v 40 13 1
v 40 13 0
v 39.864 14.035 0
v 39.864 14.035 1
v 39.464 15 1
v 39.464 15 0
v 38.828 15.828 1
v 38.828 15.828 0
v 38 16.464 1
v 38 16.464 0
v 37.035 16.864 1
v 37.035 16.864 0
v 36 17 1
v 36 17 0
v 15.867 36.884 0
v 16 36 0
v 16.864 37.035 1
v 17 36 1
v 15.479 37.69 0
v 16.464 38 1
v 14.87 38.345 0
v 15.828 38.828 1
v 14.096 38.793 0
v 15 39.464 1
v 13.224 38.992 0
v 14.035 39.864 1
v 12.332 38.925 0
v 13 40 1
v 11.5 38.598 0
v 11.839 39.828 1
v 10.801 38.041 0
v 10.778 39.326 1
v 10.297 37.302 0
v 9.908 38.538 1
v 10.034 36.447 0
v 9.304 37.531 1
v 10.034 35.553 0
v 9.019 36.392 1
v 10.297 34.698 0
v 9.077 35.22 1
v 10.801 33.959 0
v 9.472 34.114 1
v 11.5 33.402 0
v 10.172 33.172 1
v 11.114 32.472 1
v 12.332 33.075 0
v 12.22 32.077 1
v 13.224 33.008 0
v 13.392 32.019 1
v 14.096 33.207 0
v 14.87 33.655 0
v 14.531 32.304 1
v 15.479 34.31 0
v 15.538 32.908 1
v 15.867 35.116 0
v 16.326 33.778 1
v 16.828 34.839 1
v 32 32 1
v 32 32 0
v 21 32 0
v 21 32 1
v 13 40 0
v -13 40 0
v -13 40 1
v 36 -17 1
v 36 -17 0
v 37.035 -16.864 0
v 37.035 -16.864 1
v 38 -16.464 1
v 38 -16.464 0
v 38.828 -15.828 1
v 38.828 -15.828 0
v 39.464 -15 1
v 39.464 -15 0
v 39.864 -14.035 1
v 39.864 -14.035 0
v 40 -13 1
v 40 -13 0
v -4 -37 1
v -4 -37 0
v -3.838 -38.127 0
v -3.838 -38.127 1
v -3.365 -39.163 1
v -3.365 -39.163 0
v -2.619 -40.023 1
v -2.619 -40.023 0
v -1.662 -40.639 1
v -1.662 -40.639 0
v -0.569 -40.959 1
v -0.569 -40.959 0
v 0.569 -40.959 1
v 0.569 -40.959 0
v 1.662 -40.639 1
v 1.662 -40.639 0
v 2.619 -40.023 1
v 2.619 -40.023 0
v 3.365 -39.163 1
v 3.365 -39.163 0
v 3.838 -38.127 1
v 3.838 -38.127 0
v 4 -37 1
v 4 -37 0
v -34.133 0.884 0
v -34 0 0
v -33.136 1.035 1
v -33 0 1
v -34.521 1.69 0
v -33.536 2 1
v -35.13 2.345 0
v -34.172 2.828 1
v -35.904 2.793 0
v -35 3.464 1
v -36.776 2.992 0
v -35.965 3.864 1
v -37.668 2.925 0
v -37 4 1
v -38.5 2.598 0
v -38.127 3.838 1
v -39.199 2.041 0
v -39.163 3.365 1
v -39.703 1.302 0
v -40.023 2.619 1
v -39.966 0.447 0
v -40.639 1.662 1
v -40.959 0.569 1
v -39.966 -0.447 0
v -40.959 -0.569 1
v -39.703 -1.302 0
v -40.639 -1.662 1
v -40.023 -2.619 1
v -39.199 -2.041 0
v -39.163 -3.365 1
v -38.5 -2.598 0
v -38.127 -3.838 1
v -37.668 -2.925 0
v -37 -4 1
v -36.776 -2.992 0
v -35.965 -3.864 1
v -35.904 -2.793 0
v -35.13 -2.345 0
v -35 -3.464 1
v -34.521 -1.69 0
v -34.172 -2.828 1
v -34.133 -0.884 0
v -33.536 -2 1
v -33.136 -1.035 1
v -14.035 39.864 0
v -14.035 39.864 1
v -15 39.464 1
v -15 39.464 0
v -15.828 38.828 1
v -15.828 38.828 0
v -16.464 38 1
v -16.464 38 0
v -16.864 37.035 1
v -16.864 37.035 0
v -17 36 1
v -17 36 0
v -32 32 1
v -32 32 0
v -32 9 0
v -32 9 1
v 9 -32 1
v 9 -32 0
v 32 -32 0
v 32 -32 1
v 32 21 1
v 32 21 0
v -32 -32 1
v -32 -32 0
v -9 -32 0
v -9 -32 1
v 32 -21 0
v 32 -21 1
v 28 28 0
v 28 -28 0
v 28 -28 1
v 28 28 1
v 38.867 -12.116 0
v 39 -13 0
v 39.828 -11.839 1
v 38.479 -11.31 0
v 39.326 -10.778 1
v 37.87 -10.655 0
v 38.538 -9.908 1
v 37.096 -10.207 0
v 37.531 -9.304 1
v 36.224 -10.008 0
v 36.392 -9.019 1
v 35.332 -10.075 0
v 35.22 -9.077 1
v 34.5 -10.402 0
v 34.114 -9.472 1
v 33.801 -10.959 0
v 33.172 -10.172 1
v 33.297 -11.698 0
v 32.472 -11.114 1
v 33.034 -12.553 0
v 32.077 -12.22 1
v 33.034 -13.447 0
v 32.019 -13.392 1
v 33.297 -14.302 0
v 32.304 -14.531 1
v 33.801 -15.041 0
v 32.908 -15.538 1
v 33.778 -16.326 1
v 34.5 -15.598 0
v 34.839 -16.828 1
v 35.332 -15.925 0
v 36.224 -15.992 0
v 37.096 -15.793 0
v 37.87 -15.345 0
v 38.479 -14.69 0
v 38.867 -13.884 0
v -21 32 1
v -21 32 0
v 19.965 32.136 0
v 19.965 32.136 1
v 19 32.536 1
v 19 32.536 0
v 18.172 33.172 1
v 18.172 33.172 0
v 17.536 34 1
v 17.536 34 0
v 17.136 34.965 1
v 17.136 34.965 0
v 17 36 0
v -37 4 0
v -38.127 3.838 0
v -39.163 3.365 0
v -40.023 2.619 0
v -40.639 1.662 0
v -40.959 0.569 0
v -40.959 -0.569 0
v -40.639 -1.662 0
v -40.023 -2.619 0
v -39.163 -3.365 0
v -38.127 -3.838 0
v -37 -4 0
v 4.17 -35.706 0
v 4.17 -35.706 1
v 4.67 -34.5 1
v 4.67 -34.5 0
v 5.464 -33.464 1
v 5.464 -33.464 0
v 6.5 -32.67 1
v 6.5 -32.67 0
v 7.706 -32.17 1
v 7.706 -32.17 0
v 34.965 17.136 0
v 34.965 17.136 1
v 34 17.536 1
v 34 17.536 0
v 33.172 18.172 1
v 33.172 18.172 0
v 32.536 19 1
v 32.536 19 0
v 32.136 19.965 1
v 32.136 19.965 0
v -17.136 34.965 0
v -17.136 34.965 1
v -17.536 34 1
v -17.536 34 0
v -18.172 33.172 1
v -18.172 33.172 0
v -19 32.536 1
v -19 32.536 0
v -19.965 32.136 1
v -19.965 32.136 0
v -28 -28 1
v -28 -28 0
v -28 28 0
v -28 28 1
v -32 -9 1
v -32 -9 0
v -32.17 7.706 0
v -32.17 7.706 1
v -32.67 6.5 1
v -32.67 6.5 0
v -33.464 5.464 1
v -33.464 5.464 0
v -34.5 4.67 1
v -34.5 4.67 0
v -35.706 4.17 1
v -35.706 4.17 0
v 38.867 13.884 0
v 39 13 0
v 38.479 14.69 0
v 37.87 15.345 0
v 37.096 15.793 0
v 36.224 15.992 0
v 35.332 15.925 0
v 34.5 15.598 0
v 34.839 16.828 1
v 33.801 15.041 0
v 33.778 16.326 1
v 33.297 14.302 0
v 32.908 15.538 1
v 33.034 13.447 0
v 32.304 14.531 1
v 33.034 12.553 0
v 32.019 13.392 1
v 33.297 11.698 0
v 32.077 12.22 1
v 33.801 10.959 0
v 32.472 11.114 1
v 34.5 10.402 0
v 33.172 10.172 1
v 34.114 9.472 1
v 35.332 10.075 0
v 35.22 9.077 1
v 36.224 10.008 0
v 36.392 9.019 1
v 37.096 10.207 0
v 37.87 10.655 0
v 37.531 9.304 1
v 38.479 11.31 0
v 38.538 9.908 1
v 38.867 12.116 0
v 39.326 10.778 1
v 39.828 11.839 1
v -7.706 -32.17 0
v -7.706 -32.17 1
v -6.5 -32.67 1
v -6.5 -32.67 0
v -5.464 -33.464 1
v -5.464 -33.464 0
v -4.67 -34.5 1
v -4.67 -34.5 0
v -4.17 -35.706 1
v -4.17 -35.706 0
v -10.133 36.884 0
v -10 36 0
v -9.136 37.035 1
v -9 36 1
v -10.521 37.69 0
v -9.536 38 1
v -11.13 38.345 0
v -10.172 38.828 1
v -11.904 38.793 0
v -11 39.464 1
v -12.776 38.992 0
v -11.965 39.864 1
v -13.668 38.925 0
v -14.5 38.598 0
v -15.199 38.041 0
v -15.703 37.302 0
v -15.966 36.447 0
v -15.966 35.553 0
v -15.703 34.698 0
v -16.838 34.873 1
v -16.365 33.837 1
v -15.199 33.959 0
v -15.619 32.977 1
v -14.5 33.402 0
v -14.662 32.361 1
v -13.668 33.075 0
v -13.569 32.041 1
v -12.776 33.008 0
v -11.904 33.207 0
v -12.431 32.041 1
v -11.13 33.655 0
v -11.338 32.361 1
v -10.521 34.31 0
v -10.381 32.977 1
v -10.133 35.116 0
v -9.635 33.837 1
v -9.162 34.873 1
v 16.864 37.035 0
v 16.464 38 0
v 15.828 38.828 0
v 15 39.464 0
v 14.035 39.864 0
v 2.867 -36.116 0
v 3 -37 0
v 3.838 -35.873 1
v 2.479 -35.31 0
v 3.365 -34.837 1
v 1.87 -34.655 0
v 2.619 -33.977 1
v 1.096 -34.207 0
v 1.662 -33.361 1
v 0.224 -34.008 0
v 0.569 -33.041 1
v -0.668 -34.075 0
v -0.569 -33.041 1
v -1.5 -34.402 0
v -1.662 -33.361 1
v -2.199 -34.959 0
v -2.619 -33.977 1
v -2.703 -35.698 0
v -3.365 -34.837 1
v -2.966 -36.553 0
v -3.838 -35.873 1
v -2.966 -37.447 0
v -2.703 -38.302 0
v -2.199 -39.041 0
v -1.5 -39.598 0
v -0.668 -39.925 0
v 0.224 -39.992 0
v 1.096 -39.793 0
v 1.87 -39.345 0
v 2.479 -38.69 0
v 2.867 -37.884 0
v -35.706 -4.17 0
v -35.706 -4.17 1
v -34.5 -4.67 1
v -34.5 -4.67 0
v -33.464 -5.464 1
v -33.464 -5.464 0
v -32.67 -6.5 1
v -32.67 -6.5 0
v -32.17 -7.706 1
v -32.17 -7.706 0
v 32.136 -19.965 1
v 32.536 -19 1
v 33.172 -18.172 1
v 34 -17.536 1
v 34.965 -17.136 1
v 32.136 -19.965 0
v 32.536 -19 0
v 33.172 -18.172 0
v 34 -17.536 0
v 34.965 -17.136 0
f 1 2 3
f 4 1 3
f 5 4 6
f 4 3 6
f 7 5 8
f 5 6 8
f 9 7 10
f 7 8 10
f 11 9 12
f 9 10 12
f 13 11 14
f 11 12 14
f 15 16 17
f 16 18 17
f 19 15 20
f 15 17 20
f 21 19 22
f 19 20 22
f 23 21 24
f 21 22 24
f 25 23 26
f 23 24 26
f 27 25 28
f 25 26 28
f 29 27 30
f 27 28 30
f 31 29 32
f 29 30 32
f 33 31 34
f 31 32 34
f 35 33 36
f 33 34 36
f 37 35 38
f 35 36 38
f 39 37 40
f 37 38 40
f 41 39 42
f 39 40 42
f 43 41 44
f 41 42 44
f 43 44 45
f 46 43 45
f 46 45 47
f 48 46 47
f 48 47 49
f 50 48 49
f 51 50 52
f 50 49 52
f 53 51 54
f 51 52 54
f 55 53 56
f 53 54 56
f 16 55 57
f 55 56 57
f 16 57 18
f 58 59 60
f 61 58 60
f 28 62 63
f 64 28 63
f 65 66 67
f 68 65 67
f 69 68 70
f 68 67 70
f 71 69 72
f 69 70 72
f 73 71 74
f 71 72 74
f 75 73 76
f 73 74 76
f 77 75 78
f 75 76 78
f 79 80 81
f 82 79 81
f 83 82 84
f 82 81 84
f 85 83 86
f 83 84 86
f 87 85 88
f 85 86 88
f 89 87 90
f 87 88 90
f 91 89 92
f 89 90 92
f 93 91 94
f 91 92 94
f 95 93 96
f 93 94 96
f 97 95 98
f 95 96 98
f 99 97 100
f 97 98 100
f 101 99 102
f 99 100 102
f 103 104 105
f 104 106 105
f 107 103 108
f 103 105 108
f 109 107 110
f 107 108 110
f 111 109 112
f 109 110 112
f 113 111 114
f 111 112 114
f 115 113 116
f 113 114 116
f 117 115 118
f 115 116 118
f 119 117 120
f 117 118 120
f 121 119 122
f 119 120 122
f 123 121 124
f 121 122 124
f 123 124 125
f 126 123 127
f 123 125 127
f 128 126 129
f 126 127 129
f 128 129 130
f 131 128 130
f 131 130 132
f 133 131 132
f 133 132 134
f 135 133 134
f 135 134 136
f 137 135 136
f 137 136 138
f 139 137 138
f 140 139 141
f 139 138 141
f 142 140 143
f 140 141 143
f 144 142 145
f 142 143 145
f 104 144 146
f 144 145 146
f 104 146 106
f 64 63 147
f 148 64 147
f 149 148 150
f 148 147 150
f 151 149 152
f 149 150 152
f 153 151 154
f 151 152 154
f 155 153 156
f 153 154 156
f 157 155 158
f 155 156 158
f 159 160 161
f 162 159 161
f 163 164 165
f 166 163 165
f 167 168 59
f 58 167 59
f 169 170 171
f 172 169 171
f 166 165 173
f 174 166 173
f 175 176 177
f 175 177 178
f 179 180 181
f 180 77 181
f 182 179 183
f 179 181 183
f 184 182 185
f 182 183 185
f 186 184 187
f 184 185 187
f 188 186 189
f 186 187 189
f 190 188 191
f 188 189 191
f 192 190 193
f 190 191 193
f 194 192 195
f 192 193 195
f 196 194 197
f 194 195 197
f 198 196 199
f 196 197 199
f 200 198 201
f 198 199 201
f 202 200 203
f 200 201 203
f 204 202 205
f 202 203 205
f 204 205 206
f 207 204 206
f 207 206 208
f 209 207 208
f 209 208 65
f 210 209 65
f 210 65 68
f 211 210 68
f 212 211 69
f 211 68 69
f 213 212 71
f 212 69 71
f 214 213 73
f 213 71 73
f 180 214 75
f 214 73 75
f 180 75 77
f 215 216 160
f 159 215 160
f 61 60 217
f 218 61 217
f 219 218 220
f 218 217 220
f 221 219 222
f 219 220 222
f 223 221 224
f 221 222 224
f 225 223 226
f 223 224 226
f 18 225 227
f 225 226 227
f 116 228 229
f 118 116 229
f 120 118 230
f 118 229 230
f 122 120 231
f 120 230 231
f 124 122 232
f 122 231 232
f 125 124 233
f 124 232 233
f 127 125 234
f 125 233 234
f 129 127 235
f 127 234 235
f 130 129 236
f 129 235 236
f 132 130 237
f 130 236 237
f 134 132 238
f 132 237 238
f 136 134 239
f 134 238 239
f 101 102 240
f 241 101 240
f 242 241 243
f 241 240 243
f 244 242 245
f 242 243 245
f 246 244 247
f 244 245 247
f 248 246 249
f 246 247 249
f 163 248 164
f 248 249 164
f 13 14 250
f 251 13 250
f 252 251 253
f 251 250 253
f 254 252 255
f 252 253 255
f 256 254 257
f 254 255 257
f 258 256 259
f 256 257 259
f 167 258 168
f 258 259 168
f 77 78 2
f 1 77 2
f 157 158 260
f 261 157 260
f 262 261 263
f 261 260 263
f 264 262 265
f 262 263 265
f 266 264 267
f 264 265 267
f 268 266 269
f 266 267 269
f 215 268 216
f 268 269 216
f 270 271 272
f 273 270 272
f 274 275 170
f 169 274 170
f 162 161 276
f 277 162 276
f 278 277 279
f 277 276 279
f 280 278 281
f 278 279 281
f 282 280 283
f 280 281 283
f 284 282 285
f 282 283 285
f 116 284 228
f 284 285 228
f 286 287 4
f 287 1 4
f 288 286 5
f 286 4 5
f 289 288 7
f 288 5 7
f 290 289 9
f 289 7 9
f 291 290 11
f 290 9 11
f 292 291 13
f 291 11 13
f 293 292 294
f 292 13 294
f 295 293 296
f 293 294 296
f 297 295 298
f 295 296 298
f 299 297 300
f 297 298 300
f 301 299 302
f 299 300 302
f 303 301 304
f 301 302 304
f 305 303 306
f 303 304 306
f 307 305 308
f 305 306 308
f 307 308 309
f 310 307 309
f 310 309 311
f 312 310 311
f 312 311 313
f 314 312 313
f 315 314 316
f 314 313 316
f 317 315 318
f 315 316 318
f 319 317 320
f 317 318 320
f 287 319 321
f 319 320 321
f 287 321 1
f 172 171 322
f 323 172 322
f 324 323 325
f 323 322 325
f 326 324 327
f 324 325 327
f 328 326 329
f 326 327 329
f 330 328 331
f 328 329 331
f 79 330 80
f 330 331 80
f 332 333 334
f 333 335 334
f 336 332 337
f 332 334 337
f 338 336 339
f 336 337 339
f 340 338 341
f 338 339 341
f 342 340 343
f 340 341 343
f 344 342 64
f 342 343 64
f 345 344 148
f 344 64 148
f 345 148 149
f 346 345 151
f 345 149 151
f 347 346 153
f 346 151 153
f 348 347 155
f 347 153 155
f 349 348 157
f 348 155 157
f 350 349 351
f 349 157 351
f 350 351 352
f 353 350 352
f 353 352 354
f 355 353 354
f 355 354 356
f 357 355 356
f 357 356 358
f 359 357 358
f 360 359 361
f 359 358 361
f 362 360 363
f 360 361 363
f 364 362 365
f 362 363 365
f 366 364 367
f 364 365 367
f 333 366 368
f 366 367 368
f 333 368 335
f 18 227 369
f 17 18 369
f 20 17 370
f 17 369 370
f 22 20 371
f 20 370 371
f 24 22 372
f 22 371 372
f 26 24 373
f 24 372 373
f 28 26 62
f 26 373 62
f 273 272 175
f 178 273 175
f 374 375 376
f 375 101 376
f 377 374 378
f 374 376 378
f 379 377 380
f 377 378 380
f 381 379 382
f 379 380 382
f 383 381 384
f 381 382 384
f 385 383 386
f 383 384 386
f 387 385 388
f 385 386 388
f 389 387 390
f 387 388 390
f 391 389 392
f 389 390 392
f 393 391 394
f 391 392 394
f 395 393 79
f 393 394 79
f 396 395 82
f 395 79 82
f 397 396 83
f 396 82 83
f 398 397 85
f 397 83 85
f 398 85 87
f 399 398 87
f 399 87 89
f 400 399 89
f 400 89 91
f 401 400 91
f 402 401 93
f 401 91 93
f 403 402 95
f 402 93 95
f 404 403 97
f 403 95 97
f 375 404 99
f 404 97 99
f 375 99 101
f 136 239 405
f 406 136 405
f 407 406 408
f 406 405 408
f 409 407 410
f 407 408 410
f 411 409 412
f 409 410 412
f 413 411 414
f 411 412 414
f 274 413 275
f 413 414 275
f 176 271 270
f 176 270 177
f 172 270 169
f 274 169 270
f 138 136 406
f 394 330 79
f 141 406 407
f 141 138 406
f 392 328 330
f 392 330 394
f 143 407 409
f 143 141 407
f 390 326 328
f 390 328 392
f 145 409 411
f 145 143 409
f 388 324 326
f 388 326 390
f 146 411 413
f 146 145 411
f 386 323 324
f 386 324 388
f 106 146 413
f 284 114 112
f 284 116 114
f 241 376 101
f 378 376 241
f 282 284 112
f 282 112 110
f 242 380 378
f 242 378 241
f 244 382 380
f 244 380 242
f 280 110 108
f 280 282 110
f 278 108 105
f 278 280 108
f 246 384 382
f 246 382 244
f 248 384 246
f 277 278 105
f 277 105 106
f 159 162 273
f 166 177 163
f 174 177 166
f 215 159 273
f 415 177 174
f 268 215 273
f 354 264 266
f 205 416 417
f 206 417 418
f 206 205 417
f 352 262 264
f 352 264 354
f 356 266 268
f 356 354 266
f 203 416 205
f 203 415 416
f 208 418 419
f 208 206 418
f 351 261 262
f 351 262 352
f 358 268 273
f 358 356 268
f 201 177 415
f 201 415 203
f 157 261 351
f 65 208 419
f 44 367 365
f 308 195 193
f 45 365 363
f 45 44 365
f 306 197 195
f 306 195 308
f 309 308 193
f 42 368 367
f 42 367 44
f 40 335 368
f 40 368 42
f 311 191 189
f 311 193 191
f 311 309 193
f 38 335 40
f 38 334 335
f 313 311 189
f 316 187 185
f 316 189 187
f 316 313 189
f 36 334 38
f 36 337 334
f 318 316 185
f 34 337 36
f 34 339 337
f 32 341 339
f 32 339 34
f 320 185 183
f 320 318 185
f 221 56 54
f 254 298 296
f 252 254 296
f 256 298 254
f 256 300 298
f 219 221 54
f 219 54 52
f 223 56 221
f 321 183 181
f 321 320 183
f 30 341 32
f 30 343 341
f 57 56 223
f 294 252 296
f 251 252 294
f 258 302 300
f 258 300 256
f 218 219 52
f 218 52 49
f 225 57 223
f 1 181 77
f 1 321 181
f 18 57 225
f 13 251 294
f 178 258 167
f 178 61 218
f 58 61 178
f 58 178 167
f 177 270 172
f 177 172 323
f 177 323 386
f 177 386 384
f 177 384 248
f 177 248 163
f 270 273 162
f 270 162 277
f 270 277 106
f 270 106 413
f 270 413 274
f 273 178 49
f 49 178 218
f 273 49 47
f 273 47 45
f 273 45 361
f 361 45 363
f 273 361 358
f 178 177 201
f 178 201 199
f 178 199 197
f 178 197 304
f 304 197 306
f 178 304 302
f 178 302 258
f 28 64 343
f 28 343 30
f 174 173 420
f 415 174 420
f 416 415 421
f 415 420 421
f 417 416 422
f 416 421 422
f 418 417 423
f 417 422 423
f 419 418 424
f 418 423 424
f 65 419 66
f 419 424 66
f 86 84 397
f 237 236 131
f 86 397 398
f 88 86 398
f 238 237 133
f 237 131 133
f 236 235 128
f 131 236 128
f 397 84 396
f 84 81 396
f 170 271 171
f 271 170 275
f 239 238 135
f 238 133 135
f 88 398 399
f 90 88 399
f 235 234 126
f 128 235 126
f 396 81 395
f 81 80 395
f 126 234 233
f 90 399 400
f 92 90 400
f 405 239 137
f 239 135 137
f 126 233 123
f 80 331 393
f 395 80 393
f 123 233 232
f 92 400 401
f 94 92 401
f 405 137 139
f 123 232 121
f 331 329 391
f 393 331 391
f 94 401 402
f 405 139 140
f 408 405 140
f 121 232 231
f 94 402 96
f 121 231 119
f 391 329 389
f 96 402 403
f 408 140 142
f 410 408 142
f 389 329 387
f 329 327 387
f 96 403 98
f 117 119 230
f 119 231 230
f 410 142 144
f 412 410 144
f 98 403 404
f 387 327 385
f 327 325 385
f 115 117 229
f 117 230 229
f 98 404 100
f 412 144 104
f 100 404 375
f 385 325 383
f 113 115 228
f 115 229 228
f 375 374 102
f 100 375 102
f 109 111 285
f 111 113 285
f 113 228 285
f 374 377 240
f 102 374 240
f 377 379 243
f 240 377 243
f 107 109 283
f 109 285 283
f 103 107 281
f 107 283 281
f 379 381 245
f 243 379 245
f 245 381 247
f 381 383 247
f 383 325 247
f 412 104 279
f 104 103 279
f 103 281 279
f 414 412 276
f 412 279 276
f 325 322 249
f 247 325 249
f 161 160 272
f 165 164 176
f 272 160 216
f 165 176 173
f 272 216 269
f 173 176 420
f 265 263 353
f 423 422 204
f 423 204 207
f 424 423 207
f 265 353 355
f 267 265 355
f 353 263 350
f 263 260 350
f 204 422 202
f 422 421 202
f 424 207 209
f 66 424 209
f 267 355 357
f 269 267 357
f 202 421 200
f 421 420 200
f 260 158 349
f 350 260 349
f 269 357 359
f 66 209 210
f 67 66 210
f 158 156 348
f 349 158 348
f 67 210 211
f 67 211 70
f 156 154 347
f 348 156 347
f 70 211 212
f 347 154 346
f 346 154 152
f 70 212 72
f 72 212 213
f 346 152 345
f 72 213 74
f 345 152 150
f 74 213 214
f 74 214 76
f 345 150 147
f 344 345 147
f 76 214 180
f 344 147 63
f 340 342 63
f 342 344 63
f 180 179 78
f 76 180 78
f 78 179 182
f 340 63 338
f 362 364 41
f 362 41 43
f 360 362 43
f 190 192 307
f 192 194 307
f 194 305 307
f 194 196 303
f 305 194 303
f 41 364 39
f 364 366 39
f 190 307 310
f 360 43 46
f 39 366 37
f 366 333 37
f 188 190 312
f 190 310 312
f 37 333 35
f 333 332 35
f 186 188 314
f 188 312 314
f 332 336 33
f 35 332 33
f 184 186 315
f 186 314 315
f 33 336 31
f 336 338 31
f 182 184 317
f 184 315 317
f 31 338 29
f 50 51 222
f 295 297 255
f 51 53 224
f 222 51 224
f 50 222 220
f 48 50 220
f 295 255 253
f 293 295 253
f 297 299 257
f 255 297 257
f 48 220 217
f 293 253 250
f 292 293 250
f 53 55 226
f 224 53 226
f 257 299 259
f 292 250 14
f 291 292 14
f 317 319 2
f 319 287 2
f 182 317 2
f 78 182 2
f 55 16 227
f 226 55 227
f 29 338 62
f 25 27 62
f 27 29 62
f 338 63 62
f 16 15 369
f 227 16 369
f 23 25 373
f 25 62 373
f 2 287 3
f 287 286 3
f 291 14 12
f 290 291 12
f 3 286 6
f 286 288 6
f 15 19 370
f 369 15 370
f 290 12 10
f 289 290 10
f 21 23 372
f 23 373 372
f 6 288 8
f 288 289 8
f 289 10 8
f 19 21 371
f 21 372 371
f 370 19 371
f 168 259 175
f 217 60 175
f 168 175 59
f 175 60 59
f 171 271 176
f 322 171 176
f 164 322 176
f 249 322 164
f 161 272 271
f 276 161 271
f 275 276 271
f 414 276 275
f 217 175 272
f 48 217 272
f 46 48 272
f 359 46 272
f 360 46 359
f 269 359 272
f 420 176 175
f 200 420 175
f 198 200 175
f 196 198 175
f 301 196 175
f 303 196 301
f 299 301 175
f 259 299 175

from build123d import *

# Parameters (mm, degrees)
SKETCH1_R           = 2
SKETCH1_W           = 56
SKETCH1_H           = 56
BOSS_EXTRUDE1_DEPTH = 1
CHAMFER1_SIZE       = 2


with BuildPart() as part:
    # Sketch1 → Boss-Extrude1 (new body)
    with BuildSketch(Plane.XY):
        with BuildLine():
            Line((40, -13), (40, 13))
            ThreePointArc((40, 13), (38.828427125, 15.828427125), (36, 17))
            ThreePointArc((36, 17), (33.171572875, 18.171572875), (32, 21))
            Line((32, 21), (32, 32))
            Line((32, 32), (21, 32))
            ThreePointArc((21, 32), (18.171572875, 33.171572875), (17, 36))
            ThreePointArc((17, 36), (15.828427125, 38.828427125), (13, 40))
            Line((13, 40), (-13, 40))
            ThreePointArc((-13, 40), (-15.828427125, 38.828427125), (-17, 36))
            ThreePointArc((-17, 36), (-18.171572875, 33.171572875), (-21, 32))
            Line((-21, 32), (-32, 32))
            Line((-32, 32), (-32, 9))
            ThreePointArc((-32, 9), (-33.464466094, 5.464466094), (-37, 4))
            ThreePointArc((-37, 4), (-41, 0), (-37, -4))
            ThreePointArc((-37, -4), (-33.464466094, -5.464466094), (-32, -9))
            Line((-32, -9), (-32, -32))
            Line((-32, -32), (-9, -32))
            ThreePointArc((-9, -32), (-5.464466094, -33.464466094), (-4, -37))
            ThreePointArc((-4, -37), (0, -41), (4, -37))
            ThreePointArc((4, -37), (5.464466094, -33.464466094), (9, -32))
            Line((9, -32), (32, -32))
            Line((32, -32), (32, -21))
            ThreePointArc((32, -21), (33.171572875, -18.171572875), (36, -17))
            ThreePointArc((36, -17), (38.828427125, -15.828427125), (40, -13))
        make_face()
        with Locations((-37, 0)):
            Circle(SKETCH1_R, mode=Mode.SUBTRACT)
        with Locations((-13, 36)):
            Circle(SKETCH1_R, mode=Mode.SUBTRACT)
        with Locations((0, -37)):
            Circle(SKETCH1_R, mode=Mode.SUBTRACT)
        with Locations((36, -13)):
            Circle(SKETCH1_R, mode=Mode.SUBTRACT)
        with Locations((36, 13)):
            Circle(SKETCH1_R, mode=Mode.SUBTRACT)
        with Locations((13, 36)):
            Circle(SKETCH1_R, mode=Mode.SUBTRACT)
        Rectangle(SKETCH1_W, SKETCH1_H, mode=Mode.SUBTRACT)
    extrude(amount=BOSS_EXTRUDE1_DEPTH)

    # Chamfer1
    # the kernel refuses this chamfer: 2 mm, written as the material it takes off along each edge
    with BuildSketch(Plane(origin=(13, 36, 1), x_dir=(1, 0, 0), z_dir=(0, -1, 0))) as chamfer1_piece_1:
        Polygon((2, -CHAMFER1_SIZE), (2 + CHAMFER1_SIZE, 0), (2, 0), align=None)
    revolve(axis=Axis((13, 36, 1), (0, 0, 1)), mode=Mode.SUBTRACT)
    with BuildSketch(Plane(origin=(-13, 36, 1), x_dir=(1, 0, 0), z_dir=(0, -1, 0))) as chamfer1_piece_2:
        Polygon((2, -CHAMFER1_SIZE), (2 + CHAMFER1_SIZE, 0), (2, 0), align=None)
    revolve(axis=Axis((-13, 36, 1), (0, 0, 1)), mode=Mode.SUBTRACT)
    with BuildSketch(Plane(origin=(-37, 0, 1), x_dir=(1, 0, 0), z_dir=(0, -1, 0))) as chamfer1_piece_3:
        Polygon((2, -CHAMFER1_SIZE), (2 + CHAMFER1_SIZE, 0), (2, 0), align=None)
    revolve(axis=Axis((-37, 0, 1), (0, 0, 1)), mode=Mode.SUBTRACT)
    with BuildSketch(Plane(origin=(36, -13, 1), x_dir=(1, 0, 0), z_dir=(0, -1, 0))) as chamfer1_piece_4:
        Polygon((2, -CHAMFER1_SIZE), (2 + CHAMFER1_SIZE, 0), (2, 0), align=None)
    revolve(axis=Axis((36, -13, 1), (0, 0, 1)), mode=Mode.SUBTRACT)
    with BuildSketch(Plane(origin=(0, -37, 1), x_dir=(1, 0, 0), z_dir=(0, -1, 0))) as chamfer1_piece_5:
        Polygon((2, -CHAMFER1_SIZE), (2 + CHAMFER1_SIZE, 0), (2, 0), align=None)
    revolve(axis=Axis((0, -37, 1), (0, 0, 1)), mode=Mode.SUBTRACT)
    with BuildSketch(Plane(origin=(36, 13, 1), x_dir=(1, 0, 0), z_dir=(0, -1, 0))) as chamfer1_piece_6:
        Polygon((2, -CHAMFER1_SIZE), (2 + CHAMFER1_SIZE, 0), (2, 0), align=None)
    revolve(axis=Axis((36, 13, 1), (0, 0, 1)), mode=Mode.SUBTRACT)


solid = part.part
